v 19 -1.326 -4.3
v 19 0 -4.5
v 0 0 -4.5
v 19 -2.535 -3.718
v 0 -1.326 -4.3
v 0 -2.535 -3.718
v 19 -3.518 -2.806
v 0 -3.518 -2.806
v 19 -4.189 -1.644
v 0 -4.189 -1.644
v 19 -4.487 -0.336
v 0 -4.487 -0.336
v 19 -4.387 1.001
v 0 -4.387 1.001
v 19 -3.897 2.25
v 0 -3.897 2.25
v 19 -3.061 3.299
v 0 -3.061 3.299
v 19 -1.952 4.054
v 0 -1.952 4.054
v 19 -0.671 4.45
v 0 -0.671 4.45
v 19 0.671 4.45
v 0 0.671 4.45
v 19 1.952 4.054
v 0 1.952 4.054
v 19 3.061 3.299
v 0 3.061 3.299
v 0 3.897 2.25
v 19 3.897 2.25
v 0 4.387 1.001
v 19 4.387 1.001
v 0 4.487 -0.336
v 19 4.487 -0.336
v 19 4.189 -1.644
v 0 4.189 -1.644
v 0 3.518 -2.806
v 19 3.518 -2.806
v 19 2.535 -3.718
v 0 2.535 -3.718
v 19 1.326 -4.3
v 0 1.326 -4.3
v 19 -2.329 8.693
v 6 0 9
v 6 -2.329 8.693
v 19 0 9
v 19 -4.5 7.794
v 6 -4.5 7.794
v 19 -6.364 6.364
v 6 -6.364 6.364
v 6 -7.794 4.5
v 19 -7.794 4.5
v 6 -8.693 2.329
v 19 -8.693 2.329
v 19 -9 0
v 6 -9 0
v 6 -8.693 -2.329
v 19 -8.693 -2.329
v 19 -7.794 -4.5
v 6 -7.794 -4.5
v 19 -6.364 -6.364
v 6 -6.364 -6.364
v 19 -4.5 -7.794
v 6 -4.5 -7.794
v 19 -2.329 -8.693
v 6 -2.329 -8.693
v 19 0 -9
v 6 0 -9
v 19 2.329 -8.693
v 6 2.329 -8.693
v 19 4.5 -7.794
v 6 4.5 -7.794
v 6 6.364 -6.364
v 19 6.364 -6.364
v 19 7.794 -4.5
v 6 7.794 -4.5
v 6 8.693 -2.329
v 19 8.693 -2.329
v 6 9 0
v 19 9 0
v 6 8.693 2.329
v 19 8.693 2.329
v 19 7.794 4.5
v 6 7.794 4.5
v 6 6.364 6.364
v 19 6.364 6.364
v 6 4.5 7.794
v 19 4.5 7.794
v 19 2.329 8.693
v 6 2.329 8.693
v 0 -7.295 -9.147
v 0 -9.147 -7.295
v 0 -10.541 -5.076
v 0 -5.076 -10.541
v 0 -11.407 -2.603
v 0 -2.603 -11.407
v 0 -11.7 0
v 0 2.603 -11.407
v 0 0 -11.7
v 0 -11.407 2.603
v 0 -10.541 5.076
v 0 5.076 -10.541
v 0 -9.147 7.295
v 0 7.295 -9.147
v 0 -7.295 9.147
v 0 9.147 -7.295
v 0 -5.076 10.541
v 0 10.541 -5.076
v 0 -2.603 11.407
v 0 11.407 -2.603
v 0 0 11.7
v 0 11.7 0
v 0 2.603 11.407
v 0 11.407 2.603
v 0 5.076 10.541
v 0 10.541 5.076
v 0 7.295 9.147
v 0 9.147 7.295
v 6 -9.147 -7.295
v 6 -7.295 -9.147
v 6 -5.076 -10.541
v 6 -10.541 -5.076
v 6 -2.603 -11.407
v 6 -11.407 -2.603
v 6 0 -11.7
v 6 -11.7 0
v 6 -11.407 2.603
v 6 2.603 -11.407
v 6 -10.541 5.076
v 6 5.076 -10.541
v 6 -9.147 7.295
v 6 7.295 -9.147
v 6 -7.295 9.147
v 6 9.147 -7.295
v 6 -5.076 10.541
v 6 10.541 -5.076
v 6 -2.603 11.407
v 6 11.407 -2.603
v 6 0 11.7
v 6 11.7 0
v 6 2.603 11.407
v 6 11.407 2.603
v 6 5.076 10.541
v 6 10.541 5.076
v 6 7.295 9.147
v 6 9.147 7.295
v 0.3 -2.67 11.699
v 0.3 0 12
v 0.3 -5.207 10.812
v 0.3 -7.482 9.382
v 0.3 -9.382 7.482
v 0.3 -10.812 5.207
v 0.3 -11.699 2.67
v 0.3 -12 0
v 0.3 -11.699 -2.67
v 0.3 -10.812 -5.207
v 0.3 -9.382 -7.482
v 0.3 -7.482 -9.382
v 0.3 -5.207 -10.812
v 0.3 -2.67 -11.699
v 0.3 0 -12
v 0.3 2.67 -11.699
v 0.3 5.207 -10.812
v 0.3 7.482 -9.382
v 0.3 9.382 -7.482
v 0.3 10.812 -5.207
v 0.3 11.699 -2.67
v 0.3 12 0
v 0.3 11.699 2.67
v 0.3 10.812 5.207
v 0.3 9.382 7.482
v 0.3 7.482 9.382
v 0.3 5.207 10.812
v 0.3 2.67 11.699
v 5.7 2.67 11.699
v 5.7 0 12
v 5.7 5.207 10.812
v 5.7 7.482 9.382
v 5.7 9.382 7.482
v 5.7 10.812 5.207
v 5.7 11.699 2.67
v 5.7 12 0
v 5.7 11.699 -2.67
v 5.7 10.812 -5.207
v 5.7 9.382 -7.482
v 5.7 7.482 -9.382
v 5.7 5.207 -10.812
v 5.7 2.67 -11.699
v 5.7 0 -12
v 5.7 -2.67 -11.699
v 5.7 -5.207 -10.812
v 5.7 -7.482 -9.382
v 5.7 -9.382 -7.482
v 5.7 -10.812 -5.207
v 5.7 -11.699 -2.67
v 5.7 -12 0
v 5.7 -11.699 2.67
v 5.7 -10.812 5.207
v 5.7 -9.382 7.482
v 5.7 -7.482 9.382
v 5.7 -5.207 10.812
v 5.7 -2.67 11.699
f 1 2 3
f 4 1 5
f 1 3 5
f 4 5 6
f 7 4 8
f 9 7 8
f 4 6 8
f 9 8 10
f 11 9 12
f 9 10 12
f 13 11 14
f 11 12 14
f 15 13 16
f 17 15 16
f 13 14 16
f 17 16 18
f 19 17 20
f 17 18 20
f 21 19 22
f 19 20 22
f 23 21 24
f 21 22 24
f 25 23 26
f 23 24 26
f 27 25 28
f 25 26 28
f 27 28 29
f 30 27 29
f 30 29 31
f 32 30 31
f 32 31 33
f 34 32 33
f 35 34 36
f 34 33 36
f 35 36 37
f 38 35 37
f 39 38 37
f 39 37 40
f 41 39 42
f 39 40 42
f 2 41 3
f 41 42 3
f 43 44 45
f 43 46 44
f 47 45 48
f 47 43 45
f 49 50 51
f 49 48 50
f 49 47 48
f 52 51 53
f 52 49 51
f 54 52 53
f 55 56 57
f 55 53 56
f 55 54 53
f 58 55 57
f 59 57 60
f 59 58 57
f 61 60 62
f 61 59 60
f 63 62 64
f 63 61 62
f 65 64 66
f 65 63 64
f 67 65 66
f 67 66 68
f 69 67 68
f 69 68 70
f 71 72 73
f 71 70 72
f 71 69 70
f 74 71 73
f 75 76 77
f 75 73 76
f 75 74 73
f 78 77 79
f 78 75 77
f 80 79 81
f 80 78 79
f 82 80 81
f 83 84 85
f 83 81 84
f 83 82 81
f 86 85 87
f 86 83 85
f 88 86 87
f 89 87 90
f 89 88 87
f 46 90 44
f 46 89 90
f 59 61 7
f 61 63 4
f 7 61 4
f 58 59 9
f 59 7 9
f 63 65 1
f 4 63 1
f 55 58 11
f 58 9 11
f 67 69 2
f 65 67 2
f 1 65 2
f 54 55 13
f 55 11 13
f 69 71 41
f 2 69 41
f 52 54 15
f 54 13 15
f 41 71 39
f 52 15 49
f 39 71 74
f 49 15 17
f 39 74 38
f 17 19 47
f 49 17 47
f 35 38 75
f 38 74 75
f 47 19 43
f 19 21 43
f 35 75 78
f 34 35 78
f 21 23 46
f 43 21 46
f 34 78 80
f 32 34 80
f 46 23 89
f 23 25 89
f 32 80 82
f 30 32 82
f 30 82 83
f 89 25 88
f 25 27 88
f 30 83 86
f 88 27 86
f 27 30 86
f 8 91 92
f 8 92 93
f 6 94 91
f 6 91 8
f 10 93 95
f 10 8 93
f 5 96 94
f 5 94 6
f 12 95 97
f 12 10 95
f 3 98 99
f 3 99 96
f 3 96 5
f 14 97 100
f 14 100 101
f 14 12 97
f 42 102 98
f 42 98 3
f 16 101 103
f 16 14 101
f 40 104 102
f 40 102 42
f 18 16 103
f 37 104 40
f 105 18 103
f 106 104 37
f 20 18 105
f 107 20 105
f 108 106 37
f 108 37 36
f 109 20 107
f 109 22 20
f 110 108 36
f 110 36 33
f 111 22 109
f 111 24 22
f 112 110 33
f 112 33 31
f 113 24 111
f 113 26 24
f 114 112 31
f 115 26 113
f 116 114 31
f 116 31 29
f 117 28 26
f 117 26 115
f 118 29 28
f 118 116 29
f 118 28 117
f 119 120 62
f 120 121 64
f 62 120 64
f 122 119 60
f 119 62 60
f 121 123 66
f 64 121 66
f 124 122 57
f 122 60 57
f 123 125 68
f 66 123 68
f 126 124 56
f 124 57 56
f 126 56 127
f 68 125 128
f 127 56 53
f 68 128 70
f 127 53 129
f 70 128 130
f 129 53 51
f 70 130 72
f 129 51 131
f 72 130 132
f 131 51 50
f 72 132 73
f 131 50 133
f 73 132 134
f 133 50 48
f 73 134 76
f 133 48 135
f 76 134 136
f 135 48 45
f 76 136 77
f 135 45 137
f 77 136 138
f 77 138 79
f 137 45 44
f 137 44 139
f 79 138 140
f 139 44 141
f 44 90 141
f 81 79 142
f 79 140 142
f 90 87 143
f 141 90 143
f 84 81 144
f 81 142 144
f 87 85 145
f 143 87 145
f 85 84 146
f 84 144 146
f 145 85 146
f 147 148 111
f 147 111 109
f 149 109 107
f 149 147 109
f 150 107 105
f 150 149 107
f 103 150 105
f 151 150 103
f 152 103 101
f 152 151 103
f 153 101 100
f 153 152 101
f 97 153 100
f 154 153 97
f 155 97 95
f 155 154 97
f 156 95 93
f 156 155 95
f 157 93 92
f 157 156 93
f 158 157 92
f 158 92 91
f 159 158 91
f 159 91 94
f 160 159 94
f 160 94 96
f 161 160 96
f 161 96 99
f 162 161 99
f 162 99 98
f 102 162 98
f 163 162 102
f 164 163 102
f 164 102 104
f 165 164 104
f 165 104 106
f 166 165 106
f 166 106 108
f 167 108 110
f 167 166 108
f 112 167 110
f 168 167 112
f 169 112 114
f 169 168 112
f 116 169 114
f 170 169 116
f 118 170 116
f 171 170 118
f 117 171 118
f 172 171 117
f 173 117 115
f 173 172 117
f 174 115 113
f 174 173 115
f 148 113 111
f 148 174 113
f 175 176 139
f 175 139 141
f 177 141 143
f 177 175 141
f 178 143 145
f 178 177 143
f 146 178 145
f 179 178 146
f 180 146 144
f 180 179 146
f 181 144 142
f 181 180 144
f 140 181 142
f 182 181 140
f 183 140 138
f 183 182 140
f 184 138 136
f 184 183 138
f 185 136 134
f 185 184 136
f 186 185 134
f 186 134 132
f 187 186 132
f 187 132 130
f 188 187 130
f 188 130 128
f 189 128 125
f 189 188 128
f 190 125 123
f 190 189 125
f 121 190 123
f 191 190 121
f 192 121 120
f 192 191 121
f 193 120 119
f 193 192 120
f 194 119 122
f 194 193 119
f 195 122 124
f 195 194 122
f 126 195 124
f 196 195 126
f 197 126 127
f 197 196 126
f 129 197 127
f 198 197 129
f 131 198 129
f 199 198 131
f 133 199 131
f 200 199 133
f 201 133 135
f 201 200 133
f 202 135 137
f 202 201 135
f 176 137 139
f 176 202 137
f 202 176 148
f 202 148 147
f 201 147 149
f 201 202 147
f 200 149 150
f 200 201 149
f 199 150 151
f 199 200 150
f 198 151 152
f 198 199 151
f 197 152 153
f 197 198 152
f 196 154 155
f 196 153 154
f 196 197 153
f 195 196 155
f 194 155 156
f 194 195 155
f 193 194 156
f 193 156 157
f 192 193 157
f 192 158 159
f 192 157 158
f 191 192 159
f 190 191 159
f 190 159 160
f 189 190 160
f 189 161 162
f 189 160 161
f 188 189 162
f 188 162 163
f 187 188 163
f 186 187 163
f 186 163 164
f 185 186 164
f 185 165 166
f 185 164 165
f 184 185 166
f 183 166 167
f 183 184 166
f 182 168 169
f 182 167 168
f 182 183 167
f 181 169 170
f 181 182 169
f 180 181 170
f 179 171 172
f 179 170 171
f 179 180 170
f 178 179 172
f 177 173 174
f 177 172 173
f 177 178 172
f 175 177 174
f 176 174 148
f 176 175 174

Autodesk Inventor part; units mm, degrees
ref_plane "YZ Plane" through (0, 0, 0) normal (1, 0, 0) x (0, 1, 0)
ref_plane "XZ Plane" through (0, 0, 0) normal (0, 1, 0) x (-1, 0, 0)
sketch "Skizze1" plane through (0, 0, 0) normal (0, 1, 0) x (-1, 0, 0)
  line L0 (0, 0) -> (0, 12)
  line L1 (0, 12) -> (-6, 12)
  line L2 (-6, 12) -> (-6, 9)
  line L3 (-6, 9) -> (-19, 9)
  line L4 (-19, 9) -> (-19, 0)
  line L5 (-19, 0) -> (0, 0)
  dimension "d0" = 24
  dimension "d1" = 18
  dimension "d2" = 6
  dimension "d3" = 13
revolve "Umdrehung1" add sketch "Skizze1" angle 360 about axis through (19, 0, 0) along (-1, 0, 0)
sketch "Skizze2" plane through (19, 0, 0) normal (1, 0, 0) x (0, 0, -1)
  circle A0 centre (0, 0) radius 9 projected
hole "Bohrung1" at (19, 0, 0) direction (-1, 0, 0) diameter 9 depth 19
thread "Gewinde1" size "M18x2.5" class "6g" standard "ISO Metric profile" length 18
ref_plane "Arbeitsebene1" through (0, 0, 12) normal (0, 0, 1) x (1, 0, 0)
chamfer "Fasen1" distance 0.3 angle 45 2 edges at (0, 0, -12) (6, 0, -12)
properties part number "1102"
